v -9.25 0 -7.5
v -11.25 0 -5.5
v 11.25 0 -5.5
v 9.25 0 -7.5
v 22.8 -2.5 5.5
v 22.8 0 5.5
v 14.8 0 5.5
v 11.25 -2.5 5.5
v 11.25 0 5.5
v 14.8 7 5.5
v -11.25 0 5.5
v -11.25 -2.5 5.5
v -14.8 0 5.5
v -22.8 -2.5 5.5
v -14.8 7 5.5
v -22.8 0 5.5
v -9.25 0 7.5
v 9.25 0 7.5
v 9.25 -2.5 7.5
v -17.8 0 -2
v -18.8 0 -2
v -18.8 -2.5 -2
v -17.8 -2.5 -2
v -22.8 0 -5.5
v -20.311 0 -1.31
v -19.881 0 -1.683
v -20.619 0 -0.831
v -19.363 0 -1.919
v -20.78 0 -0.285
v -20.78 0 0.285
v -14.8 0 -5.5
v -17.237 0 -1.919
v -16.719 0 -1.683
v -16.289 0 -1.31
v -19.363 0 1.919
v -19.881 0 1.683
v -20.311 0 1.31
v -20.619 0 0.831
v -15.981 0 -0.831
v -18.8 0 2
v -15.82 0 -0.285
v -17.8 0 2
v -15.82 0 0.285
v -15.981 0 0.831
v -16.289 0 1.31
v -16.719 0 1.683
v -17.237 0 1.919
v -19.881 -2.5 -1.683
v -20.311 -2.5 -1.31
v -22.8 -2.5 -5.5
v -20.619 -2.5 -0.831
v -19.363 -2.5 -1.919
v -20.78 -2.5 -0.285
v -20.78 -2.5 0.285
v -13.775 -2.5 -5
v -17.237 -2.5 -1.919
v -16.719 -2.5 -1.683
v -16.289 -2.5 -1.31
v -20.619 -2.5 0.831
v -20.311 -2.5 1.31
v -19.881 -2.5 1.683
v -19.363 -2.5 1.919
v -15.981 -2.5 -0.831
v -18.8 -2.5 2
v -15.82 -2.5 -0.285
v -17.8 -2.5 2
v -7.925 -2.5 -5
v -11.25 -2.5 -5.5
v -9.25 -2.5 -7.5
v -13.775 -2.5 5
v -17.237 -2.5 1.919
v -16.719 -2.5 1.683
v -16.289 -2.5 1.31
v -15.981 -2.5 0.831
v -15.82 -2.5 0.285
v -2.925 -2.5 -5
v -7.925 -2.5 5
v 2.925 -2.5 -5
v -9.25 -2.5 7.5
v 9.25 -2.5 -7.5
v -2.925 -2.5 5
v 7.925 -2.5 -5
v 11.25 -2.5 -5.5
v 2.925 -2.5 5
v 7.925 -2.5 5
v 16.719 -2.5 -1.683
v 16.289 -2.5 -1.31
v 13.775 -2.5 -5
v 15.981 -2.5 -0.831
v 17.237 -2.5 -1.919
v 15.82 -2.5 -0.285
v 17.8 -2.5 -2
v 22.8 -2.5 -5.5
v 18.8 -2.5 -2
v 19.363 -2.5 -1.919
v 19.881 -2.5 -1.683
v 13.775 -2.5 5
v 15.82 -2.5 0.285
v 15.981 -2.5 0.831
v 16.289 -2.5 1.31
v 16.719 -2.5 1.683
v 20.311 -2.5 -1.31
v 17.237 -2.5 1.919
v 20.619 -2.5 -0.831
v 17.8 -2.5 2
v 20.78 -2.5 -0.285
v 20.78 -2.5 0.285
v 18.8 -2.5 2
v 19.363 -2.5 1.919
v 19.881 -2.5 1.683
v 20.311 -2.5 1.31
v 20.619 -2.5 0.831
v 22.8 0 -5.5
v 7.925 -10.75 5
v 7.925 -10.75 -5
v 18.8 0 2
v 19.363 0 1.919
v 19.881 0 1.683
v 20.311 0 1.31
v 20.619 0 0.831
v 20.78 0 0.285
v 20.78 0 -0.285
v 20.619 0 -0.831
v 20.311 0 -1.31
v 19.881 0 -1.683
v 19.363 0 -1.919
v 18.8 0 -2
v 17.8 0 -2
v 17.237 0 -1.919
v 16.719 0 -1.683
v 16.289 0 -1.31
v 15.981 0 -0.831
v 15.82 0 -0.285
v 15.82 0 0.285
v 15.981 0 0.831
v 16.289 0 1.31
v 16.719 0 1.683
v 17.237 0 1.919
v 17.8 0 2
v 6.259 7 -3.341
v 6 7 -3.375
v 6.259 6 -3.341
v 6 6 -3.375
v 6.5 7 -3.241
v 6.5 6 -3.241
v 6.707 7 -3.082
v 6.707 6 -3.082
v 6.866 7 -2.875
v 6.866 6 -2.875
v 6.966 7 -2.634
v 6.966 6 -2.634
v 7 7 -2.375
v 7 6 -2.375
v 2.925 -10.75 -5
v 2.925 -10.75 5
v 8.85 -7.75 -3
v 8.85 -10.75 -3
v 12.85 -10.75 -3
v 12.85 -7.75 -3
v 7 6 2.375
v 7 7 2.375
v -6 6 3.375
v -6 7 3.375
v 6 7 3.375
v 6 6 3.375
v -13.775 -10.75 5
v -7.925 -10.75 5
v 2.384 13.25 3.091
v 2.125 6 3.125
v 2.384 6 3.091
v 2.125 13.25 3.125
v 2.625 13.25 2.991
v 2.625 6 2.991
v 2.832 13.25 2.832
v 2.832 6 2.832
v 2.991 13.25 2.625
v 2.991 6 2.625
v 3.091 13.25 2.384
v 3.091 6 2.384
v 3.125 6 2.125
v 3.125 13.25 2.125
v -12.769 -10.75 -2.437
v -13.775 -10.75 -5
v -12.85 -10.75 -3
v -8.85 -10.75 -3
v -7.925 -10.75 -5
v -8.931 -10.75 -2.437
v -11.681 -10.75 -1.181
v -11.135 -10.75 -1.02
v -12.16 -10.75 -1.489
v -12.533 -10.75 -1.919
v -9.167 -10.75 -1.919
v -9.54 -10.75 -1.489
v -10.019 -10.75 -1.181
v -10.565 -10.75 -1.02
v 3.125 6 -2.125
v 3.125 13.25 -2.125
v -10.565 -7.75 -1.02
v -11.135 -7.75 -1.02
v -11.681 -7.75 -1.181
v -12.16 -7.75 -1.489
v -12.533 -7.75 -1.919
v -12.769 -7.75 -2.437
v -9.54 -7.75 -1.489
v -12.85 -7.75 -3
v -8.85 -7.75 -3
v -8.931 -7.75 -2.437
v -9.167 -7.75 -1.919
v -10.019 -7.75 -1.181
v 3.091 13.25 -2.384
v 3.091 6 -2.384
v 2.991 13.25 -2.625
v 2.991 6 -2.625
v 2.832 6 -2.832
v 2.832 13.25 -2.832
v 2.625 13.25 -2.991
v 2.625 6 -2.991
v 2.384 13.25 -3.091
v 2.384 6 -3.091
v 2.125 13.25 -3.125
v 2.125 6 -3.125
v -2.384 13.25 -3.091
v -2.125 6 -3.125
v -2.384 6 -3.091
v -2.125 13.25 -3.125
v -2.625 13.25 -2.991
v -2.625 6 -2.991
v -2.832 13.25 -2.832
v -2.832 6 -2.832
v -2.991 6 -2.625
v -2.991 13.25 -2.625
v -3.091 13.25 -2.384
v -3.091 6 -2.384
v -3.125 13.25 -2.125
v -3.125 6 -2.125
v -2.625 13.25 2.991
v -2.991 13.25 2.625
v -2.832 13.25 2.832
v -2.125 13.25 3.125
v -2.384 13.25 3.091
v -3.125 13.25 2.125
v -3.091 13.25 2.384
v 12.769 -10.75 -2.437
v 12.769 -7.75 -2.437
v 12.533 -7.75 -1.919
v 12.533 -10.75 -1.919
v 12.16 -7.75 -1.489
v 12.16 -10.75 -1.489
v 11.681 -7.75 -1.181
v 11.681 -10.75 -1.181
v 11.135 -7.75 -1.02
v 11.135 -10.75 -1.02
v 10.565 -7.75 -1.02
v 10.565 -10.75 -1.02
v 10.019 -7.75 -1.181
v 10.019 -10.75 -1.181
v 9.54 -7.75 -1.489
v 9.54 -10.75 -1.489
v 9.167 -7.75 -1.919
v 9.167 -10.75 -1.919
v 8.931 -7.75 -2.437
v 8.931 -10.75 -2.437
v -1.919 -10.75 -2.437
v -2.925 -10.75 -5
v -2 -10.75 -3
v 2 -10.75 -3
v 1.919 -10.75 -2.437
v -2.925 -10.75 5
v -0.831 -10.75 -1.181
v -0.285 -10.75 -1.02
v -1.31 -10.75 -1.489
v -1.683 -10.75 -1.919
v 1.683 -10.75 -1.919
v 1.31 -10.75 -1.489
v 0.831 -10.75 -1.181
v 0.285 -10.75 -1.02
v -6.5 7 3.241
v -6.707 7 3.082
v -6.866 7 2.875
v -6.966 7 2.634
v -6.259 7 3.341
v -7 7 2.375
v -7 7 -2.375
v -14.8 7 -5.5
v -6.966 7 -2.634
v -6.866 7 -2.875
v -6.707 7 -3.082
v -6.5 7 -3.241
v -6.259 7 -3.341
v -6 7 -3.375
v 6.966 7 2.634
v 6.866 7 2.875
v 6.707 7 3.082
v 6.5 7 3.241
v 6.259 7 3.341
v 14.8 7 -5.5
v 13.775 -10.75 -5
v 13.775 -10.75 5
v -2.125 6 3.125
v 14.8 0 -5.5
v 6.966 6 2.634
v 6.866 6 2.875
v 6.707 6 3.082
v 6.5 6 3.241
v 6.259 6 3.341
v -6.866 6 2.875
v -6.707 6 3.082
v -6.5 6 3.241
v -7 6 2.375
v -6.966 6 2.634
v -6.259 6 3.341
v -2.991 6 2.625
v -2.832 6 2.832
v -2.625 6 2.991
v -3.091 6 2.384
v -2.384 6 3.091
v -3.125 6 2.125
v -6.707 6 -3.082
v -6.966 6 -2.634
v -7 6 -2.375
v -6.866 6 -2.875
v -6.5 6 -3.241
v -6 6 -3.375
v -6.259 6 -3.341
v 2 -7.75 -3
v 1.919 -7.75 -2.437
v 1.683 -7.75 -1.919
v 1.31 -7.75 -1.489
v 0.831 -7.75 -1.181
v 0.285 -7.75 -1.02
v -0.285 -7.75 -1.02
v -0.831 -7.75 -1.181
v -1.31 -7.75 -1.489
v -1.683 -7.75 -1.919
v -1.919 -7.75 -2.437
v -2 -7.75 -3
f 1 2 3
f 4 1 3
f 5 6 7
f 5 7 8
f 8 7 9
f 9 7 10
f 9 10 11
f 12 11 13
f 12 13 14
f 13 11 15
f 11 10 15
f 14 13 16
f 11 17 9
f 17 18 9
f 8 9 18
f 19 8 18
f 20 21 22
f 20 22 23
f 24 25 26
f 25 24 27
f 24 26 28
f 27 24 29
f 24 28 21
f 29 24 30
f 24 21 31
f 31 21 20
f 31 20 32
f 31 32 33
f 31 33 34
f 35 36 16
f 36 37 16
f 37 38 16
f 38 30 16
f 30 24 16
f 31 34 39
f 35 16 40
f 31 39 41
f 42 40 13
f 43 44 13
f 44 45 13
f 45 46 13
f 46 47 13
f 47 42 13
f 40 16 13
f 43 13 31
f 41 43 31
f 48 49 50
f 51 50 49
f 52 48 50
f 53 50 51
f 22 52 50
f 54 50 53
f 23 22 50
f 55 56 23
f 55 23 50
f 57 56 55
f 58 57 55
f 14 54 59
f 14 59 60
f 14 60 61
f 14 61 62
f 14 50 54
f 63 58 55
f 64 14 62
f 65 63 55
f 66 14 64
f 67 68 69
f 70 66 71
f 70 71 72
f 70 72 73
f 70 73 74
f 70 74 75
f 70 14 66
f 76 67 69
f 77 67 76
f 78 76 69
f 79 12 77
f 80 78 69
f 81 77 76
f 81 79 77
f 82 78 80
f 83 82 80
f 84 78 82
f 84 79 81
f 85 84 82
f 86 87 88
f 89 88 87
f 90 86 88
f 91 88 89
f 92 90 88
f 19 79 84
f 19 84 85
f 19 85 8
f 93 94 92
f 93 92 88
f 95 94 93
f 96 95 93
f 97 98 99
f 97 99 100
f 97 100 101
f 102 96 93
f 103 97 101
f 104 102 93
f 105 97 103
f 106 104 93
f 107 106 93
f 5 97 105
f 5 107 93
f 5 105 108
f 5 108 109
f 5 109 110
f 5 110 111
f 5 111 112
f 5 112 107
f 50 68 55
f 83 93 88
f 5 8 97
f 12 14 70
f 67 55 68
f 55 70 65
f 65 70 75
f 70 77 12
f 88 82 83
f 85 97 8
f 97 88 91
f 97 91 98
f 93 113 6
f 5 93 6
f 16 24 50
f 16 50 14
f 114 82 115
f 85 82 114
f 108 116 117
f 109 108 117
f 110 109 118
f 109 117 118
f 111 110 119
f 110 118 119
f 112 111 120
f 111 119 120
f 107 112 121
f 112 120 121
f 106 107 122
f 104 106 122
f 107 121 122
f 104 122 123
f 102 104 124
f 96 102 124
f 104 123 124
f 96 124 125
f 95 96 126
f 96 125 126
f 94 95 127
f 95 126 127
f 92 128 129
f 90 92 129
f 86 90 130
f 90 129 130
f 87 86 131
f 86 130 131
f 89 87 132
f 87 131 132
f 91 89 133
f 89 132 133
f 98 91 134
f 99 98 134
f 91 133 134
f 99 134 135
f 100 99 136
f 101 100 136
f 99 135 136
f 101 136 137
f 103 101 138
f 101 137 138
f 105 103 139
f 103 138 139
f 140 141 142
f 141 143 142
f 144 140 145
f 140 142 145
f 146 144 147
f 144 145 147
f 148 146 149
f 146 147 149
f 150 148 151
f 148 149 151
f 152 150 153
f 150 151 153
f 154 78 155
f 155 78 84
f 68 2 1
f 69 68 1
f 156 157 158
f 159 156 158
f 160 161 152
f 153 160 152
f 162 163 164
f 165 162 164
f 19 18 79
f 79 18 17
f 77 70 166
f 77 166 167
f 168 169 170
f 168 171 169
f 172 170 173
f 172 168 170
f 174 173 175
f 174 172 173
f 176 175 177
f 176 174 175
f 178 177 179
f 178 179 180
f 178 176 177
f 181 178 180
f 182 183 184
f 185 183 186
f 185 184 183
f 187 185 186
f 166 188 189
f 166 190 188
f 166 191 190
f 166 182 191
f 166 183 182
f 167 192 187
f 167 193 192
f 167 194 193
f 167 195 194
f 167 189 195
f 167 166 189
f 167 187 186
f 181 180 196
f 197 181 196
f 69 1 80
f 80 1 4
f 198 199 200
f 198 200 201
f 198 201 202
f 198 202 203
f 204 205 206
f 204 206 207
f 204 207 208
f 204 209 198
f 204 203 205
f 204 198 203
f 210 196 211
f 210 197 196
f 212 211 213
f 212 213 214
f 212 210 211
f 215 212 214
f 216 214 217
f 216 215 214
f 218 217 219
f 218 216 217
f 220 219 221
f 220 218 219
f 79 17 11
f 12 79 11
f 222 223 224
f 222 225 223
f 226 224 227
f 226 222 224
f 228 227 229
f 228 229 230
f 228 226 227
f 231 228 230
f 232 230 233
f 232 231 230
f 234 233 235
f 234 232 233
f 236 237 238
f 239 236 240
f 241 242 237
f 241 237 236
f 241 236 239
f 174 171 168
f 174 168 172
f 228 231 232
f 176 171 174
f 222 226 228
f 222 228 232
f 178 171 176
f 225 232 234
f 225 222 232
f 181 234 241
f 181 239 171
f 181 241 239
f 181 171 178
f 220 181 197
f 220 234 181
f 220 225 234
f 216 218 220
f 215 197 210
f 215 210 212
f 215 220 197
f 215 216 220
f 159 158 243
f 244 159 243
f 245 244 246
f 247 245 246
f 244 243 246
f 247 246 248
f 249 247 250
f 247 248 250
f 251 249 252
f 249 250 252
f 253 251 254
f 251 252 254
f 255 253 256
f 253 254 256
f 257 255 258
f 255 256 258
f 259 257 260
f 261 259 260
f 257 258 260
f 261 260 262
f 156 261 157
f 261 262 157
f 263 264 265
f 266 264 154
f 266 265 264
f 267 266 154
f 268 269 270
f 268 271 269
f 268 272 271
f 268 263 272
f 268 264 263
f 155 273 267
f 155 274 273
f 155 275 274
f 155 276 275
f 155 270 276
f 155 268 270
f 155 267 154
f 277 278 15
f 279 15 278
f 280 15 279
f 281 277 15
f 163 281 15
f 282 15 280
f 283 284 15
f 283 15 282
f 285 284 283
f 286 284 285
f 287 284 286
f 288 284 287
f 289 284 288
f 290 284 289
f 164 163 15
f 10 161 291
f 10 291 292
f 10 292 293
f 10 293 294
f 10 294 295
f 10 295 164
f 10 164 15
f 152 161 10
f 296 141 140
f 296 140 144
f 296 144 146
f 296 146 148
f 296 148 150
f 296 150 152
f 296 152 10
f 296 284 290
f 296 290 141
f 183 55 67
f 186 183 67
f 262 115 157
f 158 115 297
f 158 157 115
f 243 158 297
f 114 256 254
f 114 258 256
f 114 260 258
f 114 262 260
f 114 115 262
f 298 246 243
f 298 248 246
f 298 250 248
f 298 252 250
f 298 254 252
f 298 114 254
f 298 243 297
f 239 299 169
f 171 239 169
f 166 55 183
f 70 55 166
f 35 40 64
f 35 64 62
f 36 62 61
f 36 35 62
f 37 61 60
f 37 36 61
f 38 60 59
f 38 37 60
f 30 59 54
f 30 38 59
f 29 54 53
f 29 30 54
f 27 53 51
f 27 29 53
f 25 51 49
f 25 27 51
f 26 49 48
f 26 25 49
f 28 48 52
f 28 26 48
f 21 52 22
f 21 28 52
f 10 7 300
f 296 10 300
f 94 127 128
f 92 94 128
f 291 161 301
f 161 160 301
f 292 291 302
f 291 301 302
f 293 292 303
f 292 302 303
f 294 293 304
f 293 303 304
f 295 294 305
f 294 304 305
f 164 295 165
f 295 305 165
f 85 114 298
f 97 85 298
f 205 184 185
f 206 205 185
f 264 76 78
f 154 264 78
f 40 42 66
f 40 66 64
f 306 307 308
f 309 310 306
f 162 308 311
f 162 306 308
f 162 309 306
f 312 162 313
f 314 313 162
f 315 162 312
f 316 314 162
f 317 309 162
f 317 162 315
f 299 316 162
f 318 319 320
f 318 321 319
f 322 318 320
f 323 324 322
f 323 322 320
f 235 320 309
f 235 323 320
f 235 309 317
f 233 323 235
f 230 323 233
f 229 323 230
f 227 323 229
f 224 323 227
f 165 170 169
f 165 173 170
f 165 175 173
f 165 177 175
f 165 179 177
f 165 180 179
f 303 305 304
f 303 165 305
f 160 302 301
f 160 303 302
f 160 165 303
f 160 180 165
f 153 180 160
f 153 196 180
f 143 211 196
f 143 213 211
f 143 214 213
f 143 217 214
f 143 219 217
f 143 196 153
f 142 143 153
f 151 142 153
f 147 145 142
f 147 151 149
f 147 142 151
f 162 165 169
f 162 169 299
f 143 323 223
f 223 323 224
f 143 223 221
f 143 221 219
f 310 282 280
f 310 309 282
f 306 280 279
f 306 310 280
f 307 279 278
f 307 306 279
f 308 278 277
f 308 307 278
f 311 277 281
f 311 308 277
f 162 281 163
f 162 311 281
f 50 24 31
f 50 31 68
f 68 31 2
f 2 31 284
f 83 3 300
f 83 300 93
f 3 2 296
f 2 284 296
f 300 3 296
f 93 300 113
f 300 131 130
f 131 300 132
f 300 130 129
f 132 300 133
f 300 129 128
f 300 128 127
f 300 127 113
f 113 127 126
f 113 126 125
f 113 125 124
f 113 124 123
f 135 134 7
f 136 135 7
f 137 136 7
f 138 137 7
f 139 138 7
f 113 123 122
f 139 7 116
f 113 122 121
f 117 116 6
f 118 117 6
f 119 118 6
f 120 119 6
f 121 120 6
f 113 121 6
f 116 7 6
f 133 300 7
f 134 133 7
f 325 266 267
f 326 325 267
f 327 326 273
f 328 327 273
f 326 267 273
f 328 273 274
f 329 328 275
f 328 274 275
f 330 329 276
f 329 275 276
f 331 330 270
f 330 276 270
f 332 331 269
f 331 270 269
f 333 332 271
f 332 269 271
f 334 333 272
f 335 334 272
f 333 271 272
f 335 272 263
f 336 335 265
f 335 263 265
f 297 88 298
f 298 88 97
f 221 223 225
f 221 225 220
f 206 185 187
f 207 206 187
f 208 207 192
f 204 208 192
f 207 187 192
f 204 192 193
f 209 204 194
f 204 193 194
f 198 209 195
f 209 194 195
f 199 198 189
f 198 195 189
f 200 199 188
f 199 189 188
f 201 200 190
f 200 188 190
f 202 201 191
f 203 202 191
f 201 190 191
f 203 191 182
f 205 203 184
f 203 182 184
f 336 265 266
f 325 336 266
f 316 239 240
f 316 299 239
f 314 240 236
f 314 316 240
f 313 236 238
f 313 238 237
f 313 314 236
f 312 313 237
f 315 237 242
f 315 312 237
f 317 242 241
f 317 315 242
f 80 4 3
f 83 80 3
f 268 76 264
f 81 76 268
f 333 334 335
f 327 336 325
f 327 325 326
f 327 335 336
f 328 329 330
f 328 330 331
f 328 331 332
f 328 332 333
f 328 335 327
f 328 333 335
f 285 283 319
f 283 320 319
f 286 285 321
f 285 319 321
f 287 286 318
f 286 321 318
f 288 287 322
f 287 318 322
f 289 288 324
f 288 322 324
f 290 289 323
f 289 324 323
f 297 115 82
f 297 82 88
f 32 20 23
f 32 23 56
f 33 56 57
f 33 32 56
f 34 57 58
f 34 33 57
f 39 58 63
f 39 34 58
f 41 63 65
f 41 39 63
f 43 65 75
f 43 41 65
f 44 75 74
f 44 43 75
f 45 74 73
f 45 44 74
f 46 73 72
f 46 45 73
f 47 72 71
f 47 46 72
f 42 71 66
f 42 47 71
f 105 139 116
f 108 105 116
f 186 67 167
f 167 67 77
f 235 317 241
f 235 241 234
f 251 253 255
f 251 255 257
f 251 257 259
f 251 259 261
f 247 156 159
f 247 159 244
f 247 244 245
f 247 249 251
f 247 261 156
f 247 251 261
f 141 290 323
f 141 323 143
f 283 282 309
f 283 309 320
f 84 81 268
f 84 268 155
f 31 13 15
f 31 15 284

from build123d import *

# Parameters (mm, degrees)
SKETCH1_W               = 29.6
SKETCH1_H               = 11
BOSS_EXTRUDE1_DEPTH     = 7
SKETCH2_W               = 6.25
SKETCH2_H               = 6.25
BOSS_EXTRUDE2_DEPTH     = 6.25
SKETCH3_W               = 7.999999319
SKETCH3_H               = 11
BOSS_EXTRUDE3_DEPTH     = 2.5
CUT_EXTRUDE1_DEPTH      = 14.25
CUT_EXTRUDE1_DEPTH_BACK = 3.5
SKETCH5_W               = 5.85
SKETCH5_H               = 10
BOSS_EXTRUDE4_DEPTH     = 8.25
CUT_EXTRUDE2_DEPTH      = 3
SKETCH7_W               = 14
SKETCH7_H               = 6.75
SKETCH7_W_2             = 6.25
SKETCH7_H_2             = 6.25
CUT_EXTRUDE3_DEPTH      = 1
FILLET1_R               = 1
FILLET2_R               = 1


with BuildPart() as part:
    # Sketch1 → Boss-Extrude1 (new body)
    with BuildSketch(Plane(origin=(0, 0, 0), x_dir=(1, 0, 0), z_dir=(0, 1, 0))):
        Rectangle(SKETCH1_W, SKETCH1_H)
    extrude(amount=BOSS_EXTRUDE1_DEPTH)

    # Sketch2 → Boss-Extrude2 (add)
    with BuildSketch(Plane(origin=(0, 7, 0), x_dir=(1, 0, 0), z_dir=(0, 1, 0))):
        Rectangle(SKETCH2_W, SKETCH2_H)
    extrude(amount=BOSS_EXTRUDE2_DEPTH)

    # Sketch3 → Boss-Extrude3 (add)
    with BuildSketch(Plane.XZ):
        with Locations((-18.79999966, 0)):
            Rectangle(SKETCH3_W, SKETCH3_H)
        Polygon((-14.8, 5.5), (-14.8, -5.5), (-11.25, -5.5), (11.25, -5.5), (14.8, -5.5), (14.8, 5.5), (11.25, 5.5), (0, 5.5), (-11.25, 5.5), align=None)
        Polygon((-9.25, 7.5), (-11.25, 5.5), (0, 5.5), (0, 7.5), align=None)
        Polygon((0, 7.5), (0, 5.5), (11.25, 5.5), (9.25, 7.5), align=None)
        with Locations((18.79999966, 0)):
            Rectangle(SKETCH3_W, SKETCH3_H)
        Polygon((11.25, -5.5), (-11.25, -5.5), (-9.25, -7.5), (0, -7.5), (9.25, -7.5), align=None)
    extrude(amount=BOSS_EXTRUDE3_DEPTH)

    # Sketch4 → Cut-Extrude1 (cut, two sides)
    with BuildSketch(Plane(origin=(0, 0, 0), x_dir=(1, 0, 0), z_dir=(0, 1, 0))) as cut_extrude1_sk:
        with BuildLine():
            Line((-18.799999319, 2), (-17.799999319, 2))
            ThreePointArc((-17.799999319, 2), (-15.799999319, 0), (-17.799999319, -2))
            Line((-17.799999319, -2), (-18.799999319, -2))
            ThreePointArc((-18.799999319, -2), (-20.799999319, 0), (-18.799999319, 2))
        make_face()
        with BuildLine():
            Line((18.799999319, 2), (17.799999319, 2))
            ThreePointArc((17.799999319, 2), (15.799999319, 0), (17.799999319, -2))
            Line((17.799999319, -2), (18.799999319, -2))
            ThreePointArc((18.799999319, -2), (20.799999319, 0), (18.799999319, 2))
        make_face()
    extrude(amount=CUT_EXTRUDE1_DEPTH, mode=Mode.SUBTRACT)
    extrude(cut_extrude1_sk.sketch, amount=-CUT_EXTRUDE1_DEPTH_BACK, mode=Mode.SUBTRACT)

    # Sketch5 → Boss-Extrude4 (add)
    with BuildSketch(Plane.XZ.offset(2.5)):
        Rectangle(SKETCH5_W, SKETCH5_H)
        with Locations((10.85, 0)):
            Rectangle(SKETCH5_W, SKETCH5_H)
        with Locations((-10.85, 0)):
            Rectangle(SKETCH5_W, SKETCH5_H)
    extrude(amount=BOSS_EXTRUDE4_DEPTH)

    # Sketch6 → Cut-Extrude2 (cut)
    with BuildSketch(Plane.XZ.offset(10.75)):
        with BuildLine():
            Line((-2, -3), (2, -3))
            ThreePointArc((2, -3), (0, -1), (-2, -3))
        make_face()
        with BuildLine():
            Line((8.85, -3), (12.85, -3))
            ThreePointArc((12.85, -3), (10.85, -1), (8.85, -3))
        make_face()
        with BuildLine():
            Line((-12.85, -3), (-8.85, -3))
            ThreePointArc((-8.85, -3), (-10.85, -1), (-12.85, -3))
        make_face()
    extrude(amount=-CUT_EXTRUDE2_DEPTH, mode=Mode.SUBTRACT)

    # Sketch7 → Cut-Extrude3 (cut)
    with BuildSketch(Plane(origin=(0, 7, 0), x_dir=(1, 0, 0), z_dir=(0, 1, 0))):
        Rectangle(SKETCH7_W, SKETCH7_H)
        Rectangle(SKETCH7_W_2, SKETCH7_H_2, mode=Mode.SUBTRACT)
    extrude(amount=-CUT_EXTRUDE3_DEPTH, mode=Mode.SUBTRACT)

    # Fillet1
    fillet1_edges = [part.edges().sort_by_distance(p)[0] for p in [
        (7, 6.5, 3.375),
        (-7, 6.5, 3.375),
        (-7, 6.5, -3.375),
        (7, 6.5, -3.375),
    ]]
    fillet(fillet1_edges, radius=FILLET1_R)

    # Fillet2
    fillet2_edges = [part.edges().sort_by_distance(p)[0] for p in [
        (3.125, 9.625, 3.125),
        (3.125, 9.625, -3.125),
        (-3.125, 9.625, -3.125),
        (-3.125, 9.625, 3.125),
    ]]
    fillet(fillet2_edges, radius=FILLET2_R)


solid = part.part
